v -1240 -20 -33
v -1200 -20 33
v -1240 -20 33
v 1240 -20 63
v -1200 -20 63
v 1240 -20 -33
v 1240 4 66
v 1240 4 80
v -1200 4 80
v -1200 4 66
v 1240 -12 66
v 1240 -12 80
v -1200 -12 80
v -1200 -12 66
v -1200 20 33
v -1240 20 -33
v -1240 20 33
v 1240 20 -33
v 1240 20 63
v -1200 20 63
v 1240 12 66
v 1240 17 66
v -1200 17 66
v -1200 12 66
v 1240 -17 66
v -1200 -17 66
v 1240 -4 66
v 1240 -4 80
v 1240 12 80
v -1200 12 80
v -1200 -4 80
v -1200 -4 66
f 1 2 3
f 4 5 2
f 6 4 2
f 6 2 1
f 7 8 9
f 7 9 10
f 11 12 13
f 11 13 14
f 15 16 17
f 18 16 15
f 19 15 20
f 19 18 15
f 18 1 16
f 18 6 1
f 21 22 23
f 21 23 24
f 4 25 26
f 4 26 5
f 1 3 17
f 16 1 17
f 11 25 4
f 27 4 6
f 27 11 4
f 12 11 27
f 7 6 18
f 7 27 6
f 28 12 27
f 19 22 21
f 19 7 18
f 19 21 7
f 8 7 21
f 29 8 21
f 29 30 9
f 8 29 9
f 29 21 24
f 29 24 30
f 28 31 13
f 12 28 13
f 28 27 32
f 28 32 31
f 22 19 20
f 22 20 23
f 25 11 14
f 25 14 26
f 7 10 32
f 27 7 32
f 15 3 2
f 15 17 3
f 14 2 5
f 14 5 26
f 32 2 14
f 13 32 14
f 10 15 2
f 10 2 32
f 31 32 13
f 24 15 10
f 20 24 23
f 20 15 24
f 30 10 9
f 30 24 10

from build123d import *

# Parameters (mm, degrees)
F1_W     = 40
F1_H     = 33
F3_DEPTH = 1240
F2_W     = 80
F2_H     = 100
F4_DEPTH = 25
F5_W     = 2480
F5_H     = 50
F6_DEPTH = 2512


# Not quite as in the source:
# - an extrude ends at something that could not be found from the text; its depth is read off the source's solid


with BuildPart() as f3:
    # F1 (on Right) → F3 (new body, symmetric)
    with BuildSketch(Plane.YZ):
        Polygon((20, 33), (20, 63), (17, 66), (12, 66), (12, 80), (4, 80), (4, 66), (-4, 66), (-4, 80), (-12, 80), (-12, 66), (-17, 66), (-20, 63), (-20, 33), align=None)
        with Locations((0, 16.5)):
            Rectangle(F1_W, F1_H)
        with Locations((0, -16.5)):
            Rectangle(F1_W, F1_H)
    extrude(amount=F3_DEPTH, both=True)

    # F2 (on Front) → F4 (cut, symmetric)
    with BuildSketch(Plane.XZ):
        with Locations((-1240, 83)):
            Rectangle(F2_W, F2_H)
        with Locations((-1240, -83)):
            Rectangle(F2_W, F2_H)
    extrude(amount=F4_DEPTH, both=True, mode=Mode.SUBTRACT)

    # F5 (on face) → F6 (cut, through all)
    with BuildSketch(Plane.XZ.offset(20)):
        with Locations((0, -58)):
            Rectangle(F5_W, F5_H)
    extrude(amount=-F6_DEPTH, mode=Mode.SUBTRACT)


solid = f3.part
